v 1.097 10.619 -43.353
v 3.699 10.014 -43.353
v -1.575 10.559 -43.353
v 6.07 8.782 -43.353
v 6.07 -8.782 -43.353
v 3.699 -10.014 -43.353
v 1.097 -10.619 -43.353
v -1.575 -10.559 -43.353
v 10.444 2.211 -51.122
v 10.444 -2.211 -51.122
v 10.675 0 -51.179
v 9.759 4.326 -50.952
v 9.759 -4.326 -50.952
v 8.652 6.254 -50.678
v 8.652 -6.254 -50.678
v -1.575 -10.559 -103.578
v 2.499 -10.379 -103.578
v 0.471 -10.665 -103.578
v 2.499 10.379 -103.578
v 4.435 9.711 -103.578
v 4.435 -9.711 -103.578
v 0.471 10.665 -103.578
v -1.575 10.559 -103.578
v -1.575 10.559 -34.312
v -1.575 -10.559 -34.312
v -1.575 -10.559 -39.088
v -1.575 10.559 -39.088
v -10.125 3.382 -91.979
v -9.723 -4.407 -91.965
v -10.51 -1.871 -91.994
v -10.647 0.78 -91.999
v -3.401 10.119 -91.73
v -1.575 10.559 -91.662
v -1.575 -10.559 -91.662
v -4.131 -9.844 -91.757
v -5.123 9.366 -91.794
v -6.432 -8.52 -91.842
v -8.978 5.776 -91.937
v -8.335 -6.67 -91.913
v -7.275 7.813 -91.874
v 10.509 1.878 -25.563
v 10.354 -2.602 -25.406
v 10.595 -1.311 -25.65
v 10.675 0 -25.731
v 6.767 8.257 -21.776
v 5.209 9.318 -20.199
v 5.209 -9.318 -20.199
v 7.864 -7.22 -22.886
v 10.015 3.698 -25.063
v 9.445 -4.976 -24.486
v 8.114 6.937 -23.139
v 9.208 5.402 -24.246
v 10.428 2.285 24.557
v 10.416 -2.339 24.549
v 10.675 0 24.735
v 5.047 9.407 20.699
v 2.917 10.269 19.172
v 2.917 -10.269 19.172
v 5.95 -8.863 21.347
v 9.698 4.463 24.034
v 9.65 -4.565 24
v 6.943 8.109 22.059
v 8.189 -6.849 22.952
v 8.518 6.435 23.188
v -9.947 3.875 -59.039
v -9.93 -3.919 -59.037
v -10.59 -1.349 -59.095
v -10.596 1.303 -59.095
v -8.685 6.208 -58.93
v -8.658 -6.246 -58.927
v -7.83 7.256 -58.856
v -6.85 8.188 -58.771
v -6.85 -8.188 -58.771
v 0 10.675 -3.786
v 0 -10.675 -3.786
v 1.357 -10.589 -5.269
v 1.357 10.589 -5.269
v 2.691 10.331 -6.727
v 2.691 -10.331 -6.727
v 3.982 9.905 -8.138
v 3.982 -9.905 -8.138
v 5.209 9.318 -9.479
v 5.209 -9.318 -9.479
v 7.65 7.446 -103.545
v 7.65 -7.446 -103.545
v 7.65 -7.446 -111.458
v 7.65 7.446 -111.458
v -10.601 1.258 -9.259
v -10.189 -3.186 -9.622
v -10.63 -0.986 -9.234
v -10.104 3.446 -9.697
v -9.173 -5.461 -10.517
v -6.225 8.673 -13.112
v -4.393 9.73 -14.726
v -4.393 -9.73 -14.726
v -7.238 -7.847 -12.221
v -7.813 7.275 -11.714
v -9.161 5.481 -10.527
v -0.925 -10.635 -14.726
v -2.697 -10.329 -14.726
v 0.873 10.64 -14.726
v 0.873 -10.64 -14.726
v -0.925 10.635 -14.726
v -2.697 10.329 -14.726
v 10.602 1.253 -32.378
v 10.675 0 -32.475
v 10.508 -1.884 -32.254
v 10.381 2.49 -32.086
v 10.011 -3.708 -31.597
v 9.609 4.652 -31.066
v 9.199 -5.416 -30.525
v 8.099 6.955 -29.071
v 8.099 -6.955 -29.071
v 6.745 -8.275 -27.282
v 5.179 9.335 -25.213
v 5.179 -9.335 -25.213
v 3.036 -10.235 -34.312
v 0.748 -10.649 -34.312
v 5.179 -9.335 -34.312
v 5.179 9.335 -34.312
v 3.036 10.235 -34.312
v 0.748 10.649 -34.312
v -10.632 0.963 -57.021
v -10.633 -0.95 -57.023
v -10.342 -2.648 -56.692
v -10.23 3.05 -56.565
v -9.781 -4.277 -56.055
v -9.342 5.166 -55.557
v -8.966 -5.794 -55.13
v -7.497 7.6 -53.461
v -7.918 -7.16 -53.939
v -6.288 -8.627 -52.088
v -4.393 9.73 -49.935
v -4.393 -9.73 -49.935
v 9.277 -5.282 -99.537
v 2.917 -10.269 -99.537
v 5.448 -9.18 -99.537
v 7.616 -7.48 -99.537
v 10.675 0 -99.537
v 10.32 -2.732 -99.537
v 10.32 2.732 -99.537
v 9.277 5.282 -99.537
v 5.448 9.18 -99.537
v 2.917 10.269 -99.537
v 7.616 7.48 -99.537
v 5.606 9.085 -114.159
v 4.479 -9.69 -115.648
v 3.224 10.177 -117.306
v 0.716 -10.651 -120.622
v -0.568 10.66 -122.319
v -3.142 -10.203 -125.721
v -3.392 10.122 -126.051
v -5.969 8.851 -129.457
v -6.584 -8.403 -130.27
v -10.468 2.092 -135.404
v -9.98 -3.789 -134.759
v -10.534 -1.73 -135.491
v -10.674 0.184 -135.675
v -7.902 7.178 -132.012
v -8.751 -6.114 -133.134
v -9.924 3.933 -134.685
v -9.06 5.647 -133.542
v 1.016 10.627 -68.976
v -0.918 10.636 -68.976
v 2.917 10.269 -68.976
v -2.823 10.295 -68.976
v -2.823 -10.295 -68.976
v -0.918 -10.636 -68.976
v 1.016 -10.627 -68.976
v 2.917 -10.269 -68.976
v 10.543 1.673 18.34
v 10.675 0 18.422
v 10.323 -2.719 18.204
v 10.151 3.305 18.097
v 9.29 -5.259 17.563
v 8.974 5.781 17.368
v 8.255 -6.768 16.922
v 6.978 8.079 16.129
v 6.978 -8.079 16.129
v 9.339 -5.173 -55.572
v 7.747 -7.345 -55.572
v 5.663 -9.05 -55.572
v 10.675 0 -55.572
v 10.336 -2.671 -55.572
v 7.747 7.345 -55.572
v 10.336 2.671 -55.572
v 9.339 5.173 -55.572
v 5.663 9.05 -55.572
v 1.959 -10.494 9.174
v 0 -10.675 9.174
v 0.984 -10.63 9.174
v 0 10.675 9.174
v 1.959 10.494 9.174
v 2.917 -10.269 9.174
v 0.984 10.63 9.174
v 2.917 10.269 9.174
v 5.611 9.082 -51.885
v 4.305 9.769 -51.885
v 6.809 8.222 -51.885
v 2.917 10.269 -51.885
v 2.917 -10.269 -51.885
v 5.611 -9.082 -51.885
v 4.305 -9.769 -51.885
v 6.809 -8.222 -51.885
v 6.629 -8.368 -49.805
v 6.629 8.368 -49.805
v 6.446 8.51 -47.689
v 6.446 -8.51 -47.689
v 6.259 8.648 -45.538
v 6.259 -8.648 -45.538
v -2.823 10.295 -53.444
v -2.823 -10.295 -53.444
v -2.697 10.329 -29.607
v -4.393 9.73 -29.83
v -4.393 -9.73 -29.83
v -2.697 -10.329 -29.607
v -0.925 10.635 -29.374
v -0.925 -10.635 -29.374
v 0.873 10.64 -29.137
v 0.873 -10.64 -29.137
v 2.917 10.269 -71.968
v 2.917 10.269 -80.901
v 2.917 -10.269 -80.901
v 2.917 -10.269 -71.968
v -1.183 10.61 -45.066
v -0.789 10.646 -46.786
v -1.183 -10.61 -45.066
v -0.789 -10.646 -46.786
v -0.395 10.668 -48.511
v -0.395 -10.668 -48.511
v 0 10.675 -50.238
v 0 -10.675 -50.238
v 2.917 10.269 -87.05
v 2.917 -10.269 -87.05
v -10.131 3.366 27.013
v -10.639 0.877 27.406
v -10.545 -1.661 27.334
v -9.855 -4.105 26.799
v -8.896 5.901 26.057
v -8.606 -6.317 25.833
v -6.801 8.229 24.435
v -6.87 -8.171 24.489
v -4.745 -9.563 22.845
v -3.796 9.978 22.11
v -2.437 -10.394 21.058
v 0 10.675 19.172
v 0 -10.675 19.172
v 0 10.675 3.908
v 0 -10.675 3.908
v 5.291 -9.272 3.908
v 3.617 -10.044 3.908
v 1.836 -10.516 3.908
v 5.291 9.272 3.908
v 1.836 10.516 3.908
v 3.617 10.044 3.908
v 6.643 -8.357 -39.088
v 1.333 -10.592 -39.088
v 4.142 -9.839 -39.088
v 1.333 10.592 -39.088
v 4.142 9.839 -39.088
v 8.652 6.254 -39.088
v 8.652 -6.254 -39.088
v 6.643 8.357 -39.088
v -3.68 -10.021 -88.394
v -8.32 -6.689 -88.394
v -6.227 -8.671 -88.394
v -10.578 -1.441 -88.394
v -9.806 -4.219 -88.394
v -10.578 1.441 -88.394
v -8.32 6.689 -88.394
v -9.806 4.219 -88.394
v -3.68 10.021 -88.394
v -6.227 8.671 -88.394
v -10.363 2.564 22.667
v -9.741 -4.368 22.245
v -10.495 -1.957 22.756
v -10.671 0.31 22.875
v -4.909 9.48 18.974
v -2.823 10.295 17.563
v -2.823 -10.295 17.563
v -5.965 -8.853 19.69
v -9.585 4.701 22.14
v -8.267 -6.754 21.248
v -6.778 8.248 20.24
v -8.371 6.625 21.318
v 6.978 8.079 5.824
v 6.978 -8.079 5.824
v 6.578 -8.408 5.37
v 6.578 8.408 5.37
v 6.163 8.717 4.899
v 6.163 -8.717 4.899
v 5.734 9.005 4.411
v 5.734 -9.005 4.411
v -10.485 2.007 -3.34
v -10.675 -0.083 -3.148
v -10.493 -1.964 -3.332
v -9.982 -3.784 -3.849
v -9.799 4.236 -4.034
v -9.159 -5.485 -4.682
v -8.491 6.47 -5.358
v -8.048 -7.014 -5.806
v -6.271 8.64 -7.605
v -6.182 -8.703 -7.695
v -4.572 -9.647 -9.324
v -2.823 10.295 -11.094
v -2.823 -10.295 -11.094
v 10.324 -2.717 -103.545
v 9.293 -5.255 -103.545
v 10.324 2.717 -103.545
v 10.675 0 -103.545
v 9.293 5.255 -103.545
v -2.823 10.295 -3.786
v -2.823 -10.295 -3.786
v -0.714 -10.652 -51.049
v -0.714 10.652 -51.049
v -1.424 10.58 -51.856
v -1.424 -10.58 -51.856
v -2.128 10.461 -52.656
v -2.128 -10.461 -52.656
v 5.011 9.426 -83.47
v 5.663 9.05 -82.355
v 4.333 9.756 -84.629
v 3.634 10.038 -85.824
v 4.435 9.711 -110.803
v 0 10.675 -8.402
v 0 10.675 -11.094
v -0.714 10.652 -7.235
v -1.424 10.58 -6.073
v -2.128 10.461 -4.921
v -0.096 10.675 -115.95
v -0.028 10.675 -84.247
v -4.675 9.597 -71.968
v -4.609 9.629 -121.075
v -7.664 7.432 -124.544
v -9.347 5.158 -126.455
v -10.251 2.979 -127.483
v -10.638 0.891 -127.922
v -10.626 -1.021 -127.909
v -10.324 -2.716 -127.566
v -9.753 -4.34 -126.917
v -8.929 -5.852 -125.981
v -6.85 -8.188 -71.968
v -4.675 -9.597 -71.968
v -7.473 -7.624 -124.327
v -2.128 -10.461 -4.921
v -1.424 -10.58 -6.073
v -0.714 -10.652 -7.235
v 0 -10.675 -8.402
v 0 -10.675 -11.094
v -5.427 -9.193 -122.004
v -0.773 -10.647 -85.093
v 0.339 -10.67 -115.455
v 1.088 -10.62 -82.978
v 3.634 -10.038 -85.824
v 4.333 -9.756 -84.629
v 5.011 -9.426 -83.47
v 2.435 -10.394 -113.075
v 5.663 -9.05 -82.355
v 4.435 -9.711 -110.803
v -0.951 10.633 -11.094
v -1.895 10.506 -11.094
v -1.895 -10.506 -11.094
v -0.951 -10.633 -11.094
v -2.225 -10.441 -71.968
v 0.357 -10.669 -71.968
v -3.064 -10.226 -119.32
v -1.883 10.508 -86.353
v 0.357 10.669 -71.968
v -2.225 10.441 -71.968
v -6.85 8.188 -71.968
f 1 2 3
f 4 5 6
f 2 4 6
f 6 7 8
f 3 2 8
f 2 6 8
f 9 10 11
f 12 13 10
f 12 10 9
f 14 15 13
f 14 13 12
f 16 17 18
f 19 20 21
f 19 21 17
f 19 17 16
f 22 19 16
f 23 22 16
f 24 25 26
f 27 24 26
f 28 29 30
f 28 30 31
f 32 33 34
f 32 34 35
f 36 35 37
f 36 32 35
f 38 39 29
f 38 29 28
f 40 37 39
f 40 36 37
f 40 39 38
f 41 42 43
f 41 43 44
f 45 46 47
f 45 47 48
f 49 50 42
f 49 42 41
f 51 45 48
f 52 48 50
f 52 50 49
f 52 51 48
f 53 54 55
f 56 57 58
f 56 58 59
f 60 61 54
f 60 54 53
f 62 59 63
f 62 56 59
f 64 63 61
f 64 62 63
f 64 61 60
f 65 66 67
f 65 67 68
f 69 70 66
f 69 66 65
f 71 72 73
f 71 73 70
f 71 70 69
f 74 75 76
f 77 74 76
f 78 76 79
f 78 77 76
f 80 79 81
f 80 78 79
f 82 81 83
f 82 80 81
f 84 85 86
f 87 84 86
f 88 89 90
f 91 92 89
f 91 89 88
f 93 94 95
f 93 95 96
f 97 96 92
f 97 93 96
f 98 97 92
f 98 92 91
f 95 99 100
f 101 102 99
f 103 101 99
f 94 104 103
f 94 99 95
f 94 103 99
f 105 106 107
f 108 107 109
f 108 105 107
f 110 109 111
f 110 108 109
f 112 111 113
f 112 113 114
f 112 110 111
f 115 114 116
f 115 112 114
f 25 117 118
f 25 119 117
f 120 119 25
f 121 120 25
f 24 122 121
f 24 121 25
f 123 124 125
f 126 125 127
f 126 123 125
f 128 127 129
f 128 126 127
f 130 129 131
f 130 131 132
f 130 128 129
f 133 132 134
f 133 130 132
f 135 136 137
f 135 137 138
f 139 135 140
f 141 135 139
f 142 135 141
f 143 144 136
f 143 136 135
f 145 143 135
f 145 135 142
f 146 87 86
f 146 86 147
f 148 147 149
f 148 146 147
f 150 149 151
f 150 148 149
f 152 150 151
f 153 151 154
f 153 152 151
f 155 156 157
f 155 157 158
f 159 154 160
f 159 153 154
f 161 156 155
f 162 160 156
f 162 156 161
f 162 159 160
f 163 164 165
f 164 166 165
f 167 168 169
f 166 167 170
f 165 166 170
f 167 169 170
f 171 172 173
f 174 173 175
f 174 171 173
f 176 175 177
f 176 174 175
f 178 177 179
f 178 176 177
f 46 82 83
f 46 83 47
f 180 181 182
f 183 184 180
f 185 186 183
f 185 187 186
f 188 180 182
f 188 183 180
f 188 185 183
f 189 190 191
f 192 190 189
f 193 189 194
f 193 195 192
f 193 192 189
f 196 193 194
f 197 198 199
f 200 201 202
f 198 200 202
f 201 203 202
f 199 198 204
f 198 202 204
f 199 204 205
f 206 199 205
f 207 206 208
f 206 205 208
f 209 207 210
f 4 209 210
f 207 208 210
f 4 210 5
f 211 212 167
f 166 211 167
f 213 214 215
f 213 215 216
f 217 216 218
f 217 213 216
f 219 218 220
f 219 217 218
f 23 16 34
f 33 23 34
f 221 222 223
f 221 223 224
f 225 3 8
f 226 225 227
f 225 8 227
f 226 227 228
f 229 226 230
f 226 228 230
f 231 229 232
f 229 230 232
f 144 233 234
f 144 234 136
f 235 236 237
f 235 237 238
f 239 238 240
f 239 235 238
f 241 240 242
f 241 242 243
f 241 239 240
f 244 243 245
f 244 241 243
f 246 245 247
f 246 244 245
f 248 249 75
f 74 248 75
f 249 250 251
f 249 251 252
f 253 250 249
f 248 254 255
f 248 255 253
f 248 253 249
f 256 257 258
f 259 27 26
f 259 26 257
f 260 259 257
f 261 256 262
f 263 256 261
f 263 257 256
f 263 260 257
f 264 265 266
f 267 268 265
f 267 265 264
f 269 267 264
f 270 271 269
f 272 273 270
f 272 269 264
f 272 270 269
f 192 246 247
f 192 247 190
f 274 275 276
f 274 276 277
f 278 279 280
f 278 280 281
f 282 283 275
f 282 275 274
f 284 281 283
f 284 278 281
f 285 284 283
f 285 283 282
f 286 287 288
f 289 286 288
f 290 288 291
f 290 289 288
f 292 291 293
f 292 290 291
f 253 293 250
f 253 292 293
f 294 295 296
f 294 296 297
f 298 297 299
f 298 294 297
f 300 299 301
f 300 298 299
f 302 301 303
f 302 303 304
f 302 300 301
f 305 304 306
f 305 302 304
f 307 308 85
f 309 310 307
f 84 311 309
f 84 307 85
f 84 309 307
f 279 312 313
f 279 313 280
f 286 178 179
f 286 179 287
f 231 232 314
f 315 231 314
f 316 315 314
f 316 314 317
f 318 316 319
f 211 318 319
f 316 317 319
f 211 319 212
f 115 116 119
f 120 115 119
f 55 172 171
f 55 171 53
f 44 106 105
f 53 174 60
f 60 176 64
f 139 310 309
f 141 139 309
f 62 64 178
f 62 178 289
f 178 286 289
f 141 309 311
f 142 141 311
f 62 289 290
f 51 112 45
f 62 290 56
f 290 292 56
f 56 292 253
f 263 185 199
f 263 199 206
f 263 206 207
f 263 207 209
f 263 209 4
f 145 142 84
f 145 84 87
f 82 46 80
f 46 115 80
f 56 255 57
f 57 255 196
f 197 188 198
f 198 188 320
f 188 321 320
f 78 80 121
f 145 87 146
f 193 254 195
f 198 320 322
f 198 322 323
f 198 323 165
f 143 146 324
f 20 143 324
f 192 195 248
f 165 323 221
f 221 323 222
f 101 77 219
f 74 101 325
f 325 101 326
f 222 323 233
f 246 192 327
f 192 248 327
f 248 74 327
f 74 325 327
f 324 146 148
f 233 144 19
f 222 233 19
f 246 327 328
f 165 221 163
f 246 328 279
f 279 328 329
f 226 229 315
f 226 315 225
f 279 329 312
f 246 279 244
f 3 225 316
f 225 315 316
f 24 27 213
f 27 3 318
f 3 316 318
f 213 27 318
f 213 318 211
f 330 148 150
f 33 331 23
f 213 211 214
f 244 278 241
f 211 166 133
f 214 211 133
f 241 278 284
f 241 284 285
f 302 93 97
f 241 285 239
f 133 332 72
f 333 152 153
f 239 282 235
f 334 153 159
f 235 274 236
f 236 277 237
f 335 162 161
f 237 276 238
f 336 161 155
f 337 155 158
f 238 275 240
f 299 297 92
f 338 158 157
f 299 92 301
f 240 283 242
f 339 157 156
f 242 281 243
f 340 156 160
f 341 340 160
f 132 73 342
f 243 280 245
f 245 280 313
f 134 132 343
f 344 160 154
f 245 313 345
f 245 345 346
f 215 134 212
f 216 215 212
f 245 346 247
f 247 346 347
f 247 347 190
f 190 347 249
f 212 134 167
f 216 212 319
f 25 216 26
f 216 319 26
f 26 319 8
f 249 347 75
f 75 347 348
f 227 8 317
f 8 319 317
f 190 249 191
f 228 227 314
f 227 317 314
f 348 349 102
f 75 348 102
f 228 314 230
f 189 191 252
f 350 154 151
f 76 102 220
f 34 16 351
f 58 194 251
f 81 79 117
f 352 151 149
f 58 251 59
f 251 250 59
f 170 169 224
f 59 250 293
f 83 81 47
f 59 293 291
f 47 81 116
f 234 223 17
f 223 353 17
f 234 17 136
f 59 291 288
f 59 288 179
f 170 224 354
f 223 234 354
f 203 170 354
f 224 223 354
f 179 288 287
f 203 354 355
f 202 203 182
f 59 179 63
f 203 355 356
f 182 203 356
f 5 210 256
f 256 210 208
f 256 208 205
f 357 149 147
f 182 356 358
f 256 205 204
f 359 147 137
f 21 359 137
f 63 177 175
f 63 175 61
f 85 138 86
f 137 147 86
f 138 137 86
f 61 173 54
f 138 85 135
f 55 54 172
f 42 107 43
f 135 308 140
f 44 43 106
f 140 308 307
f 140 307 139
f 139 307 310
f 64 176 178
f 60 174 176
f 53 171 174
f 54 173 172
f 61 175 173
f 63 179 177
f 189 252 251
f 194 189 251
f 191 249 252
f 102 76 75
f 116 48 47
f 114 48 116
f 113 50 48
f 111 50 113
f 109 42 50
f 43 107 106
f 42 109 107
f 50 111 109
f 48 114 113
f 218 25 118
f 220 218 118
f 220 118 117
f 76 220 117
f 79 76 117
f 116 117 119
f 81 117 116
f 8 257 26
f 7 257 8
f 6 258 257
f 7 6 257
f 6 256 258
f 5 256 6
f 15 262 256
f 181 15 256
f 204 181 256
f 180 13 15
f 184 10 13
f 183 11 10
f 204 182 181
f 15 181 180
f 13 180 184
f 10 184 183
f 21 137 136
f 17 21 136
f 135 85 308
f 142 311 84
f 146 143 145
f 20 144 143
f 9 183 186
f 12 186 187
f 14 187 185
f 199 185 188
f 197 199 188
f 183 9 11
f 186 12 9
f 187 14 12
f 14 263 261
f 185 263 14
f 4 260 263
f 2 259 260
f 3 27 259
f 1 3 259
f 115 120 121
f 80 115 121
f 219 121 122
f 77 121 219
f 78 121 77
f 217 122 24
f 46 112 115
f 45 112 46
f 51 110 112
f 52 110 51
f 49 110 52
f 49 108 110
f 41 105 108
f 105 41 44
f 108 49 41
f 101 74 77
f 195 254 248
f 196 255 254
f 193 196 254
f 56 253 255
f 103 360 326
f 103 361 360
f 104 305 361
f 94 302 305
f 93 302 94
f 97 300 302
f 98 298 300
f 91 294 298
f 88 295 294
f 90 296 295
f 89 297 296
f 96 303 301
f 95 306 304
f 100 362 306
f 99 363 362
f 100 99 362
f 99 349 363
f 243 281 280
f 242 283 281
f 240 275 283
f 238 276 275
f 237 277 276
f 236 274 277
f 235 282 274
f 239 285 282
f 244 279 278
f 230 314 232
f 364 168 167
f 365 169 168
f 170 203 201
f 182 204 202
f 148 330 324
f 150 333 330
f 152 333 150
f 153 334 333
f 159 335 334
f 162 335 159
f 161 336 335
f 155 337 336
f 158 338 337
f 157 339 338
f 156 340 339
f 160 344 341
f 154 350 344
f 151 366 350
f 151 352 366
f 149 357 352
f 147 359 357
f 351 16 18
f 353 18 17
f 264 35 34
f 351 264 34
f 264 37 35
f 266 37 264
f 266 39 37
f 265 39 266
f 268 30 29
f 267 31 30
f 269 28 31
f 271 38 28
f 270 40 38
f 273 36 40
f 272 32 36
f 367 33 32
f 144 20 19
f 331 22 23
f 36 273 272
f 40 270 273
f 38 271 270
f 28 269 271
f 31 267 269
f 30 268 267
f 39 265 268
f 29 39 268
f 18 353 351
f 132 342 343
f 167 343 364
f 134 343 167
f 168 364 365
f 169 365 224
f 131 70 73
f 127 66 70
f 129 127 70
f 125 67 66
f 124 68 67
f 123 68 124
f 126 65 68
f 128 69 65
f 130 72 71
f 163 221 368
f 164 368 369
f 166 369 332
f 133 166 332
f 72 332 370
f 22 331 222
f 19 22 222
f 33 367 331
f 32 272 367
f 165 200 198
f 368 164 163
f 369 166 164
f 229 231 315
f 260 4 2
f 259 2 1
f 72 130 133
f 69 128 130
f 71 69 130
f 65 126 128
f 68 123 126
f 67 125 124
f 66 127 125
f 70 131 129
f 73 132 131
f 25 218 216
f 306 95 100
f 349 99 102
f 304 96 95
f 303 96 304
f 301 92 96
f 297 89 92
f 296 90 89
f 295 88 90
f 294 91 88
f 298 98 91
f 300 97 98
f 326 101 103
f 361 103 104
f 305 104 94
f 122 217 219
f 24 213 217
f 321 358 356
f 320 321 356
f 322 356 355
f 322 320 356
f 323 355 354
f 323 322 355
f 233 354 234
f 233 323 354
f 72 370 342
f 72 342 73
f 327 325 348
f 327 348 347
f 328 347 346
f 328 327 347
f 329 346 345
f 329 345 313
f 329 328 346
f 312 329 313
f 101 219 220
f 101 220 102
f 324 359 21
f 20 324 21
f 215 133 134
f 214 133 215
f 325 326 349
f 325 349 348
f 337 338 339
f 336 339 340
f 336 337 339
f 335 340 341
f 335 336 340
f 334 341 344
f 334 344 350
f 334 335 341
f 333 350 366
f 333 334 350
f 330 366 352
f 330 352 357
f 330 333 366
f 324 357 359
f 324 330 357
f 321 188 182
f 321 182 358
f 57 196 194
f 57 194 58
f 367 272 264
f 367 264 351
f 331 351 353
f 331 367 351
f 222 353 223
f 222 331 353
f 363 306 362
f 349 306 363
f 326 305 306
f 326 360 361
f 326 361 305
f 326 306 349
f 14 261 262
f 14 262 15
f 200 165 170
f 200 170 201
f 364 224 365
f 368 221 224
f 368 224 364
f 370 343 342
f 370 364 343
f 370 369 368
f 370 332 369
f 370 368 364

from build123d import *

# Parameters (mm, degrees)
F0_R     = 10.675430612
F1_DEPTH = 137.16
F2_DEPTH = 38.1
F3_W     = 73.8532952964
F3_H     = 204.6351656318
F4_DEPTH = 12.7


with BuildPart() as f1:
    # F0 (on Top) → F1 (new body)
    with BuildSketch(Plane.XY):
        Circle(F0_R)
    extrude(amount=-F1_DEPTH)

    # F2 (add): a face of the model
    f2_faces = [f1.faces().sort_by_distance(p)[0] for p in [
        (0, 0, 0),
    ]]
    extrude(f2_faces, amount=F2_DEPTH)

    # F3 (on Front) → F4 (cut, symmetric)
    with BuildSketch(Plane.XZ):
        with Locations((0.4835147411, -55.2906431258)):
            Rectangle(F3_W, F3_H)
        Polygon((2.9173363, 19.1722828895), (11.8985436857, 25.6116390228), (15.7361086458, 21.5601604432), (6.9777617314, 16.1294173449), (6.9777617314, 5.8243007956), (5.2905785851, 3.9081033319), (0, 3.9081033319), (0, -3.7856895942), (5.2087670282, -9.4788996503), (5.2087670282, -20.1990260627), (15.5135185486, -30.6273752617), (12.1595710516, -34.4365797937), (5.1792738959, -25.212617591), (5.1792738959, -34.3119315803), (-1.5746362042, -34.3119315803), (-1.5746362042, -39.0876196325), (8.6516765878, -39.0876196325), (8.6516765878, -50.6781153381), (13.8188395649, -51.9570671022), (13.8188395649, -55.5720552802), (5.6630028412, -55.5720552802), (5.6630028412, -82.3548957705), (2.9173363, -87.0497524738), (2.9173363, -99.5368526672), (16.7356515435, -99.5368526672), (17.0829258859, -103.5451963544), (7.6496228576, -103.5451963544), (7.6496228576, -111.4576309919), (-13.9778433368, -140.0423496962), (-17.0550644398, -135.2102676343), (4.4348337688, -110.8033806086), (4.4348337688, -103.5782471299), (-1.5746362042, -103.5782471299), (-1.5746362042, -91.662183404), (-13.6558805862, -92.110427912), (-13.9778433368, -88.3942381419), (-3.6802912408, -88.3942381419), (2.9173363, -80.9010639787), (2.9173363, -71.9678923488), (-6.8503268994, -71.9678923488), (-6.8503268994, -58.7706156075), (-12.6116908069, -59.2697678805), (-4.392595496, -49.9350316823), (-4.392595496, -29.8299845308), (0.8731535636, -29.1371215135), (0.8731535636, -14.7255985066), (-4.392595496, -14.7255985066), (-13.9778433368, -6.2859314494), (-17.0550644398, -8.4015205503), (-13.7855187058, 0), (-2.8229181189, -11.0940886661), (0, -11.0940886661), (0, -8.4015205503), (-2.8229181189, -3.7856895942), (-2.8229181189, 17.5625272095), (-15.3241287917, 26.0248854756), (-17.0550644398, 32.3716513813), (0, 19.1722828895), (0, 9.1743338853), (2.9173363, 9.1743338853), align=None, mode=Mode.SUBTRACT)
        Polygon((6.0701598413, -43.3530472219), (-1.5746362042, -43.3530472219), (0, -50.2383581229), (-2.8229181189, -53.4444525838), (-2.8229181189, -68.9763724804), (2.9173363, -68.9763724804), (2.9173363, -51.8846450228), (6.8093192667, -51.8846450228), align=None)
    extrude(amount=F4_DEPTH, both=True, mode=Mode.SUBTRACT)


solid = f1.part
